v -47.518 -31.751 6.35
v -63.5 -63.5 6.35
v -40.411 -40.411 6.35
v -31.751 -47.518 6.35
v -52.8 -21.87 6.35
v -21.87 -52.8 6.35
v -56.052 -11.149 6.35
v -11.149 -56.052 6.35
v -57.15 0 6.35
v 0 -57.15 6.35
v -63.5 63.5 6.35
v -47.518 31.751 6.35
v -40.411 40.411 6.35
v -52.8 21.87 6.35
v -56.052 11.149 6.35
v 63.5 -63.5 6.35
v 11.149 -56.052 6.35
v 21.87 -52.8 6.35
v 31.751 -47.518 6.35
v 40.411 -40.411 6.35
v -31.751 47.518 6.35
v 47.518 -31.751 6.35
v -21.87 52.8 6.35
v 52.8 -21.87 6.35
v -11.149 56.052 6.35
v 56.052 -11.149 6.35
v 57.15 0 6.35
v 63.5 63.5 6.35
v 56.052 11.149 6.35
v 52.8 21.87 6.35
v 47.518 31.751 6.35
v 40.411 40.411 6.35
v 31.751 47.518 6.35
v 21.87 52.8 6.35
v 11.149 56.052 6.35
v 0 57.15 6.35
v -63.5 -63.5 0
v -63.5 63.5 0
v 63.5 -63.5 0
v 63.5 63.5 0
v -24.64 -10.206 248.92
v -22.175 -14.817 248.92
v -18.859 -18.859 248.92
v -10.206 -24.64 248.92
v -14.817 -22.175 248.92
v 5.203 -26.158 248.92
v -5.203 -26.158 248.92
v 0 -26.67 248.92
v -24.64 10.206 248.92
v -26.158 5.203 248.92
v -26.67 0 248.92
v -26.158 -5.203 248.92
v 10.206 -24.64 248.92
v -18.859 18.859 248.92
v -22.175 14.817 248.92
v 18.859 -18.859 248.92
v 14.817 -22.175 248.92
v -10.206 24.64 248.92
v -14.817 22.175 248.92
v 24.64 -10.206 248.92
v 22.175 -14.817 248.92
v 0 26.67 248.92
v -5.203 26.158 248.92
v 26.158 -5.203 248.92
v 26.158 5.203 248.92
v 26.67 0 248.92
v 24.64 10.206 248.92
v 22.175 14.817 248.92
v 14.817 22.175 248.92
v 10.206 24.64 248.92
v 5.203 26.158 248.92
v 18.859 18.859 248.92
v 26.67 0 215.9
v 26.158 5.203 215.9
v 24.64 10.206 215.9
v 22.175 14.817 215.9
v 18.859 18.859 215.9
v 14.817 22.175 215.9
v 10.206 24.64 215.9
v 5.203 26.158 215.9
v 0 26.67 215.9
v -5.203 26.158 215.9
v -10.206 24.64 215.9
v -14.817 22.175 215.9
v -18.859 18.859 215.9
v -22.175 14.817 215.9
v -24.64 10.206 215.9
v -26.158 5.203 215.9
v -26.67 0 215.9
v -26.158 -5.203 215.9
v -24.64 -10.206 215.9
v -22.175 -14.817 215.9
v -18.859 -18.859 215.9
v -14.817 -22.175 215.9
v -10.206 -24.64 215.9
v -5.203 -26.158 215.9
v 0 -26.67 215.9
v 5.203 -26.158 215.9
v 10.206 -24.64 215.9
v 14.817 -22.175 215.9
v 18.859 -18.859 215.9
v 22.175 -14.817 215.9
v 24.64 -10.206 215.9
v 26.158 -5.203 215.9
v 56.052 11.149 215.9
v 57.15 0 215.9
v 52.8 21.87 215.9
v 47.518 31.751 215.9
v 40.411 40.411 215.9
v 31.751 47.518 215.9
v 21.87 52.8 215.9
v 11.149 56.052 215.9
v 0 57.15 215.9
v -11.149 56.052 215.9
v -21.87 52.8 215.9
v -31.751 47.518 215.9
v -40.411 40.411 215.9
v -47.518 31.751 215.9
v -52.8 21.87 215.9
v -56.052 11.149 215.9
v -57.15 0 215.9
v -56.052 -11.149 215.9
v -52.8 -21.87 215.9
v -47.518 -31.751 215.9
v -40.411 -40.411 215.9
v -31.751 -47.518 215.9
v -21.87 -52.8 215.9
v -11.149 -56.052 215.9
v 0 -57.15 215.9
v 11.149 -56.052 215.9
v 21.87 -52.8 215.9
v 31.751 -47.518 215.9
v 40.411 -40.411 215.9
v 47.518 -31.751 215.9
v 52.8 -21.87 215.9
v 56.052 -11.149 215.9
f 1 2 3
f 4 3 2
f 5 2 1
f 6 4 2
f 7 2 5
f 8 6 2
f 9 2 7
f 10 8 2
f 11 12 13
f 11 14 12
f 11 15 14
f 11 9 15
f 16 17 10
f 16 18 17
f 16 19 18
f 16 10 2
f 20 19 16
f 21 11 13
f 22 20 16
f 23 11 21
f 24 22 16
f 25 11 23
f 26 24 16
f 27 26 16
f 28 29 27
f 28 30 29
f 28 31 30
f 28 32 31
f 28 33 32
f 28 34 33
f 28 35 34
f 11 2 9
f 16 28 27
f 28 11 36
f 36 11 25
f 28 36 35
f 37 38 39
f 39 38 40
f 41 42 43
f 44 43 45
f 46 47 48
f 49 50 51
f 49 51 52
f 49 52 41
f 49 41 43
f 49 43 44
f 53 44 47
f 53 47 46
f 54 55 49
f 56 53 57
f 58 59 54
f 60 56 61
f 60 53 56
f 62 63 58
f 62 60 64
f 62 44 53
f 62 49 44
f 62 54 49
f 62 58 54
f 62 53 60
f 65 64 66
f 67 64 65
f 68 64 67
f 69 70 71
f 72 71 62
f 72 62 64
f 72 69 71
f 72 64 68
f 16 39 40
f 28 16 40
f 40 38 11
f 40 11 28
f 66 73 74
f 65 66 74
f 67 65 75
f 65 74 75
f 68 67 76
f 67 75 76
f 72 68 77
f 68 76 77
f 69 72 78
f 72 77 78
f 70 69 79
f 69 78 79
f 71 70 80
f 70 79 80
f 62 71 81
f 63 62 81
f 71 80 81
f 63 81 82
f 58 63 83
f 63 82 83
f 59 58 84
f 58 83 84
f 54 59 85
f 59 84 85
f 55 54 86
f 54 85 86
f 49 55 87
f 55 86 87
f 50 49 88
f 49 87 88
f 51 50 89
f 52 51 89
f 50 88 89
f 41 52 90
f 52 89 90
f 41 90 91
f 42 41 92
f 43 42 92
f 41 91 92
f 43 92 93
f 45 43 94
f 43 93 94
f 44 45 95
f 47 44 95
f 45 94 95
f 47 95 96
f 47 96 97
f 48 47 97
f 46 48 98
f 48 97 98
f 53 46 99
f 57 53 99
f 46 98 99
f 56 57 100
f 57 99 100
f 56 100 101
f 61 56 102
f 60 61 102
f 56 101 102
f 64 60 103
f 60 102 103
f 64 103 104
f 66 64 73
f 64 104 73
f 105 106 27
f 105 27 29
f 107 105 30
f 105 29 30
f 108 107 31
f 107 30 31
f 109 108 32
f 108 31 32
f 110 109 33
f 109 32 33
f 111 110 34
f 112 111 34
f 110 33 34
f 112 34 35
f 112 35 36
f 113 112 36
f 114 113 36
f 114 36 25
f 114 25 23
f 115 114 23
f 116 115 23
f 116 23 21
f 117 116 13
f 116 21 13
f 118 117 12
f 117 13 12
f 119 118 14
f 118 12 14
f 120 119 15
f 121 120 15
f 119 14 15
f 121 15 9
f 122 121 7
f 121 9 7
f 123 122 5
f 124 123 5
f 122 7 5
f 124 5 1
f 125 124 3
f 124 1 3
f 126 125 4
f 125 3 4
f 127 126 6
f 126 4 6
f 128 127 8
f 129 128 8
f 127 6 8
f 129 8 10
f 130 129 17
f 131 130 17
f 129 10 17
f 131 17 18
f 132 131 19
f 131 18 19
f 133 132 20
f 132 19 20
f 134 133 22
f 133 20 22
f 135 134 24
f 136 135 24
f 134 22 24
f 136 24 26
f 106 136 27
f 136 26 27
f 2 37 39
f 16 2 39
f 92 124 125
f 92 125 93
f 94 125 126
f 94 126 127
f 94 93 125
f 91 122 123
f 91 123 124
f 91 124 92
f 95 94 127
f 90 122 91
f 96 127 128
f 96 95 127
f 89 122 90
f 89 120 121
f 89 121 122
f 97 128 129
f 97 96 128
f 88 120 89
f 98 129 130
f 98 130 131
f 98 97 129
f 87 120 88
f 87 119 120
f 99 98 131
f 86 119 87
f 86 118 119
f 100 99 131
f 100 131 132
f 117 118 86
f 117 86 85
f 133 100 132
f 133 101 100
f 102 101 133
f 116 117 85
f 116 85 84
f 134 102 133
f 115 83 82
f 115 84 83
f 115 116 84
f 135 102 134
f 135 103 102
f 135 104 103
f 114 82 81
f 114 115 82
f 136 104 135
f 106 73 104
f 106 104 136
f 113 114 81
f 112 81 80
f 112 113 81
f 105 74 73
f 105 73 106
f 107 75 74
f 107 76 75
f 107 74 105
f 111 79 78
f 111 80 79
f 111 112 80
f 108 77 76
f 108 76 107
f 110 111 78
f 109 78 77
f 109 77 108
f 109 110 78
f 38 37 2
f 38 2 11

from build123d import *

# Parameters (mm, degrees)
SKETCH1_W           = 127
SKETCH1_H           = 127
BOSS_EXTRUDE1_DEPTH = 6.35
SKETCH2_R           = 57.15
BOSS_EXTRUDE2_DEPTH = 209.55
SKETCH3_R           = 26.67
BOSS_EXTRUDE3_DEPTH = 33.02


with BuildPart() as part:
    # Sketch1 → Boss-Extrude1 (new body)
    with BuildSketch(Plane.XY):
        Rectangle(SKETCH1_W, SKETCH1_H)
    extrude(amount=BOSS_EXTRUDE1_DEPTH)

    # Sketch2 → Boss-Extrude2 (add)
    with BuildSketch(Plane.XY.offset(6.35)):
        Circle(SKETCH2_R)
    extrude(amount=BOSS_EXTRUDE2_DEPTH)

    # Sketch3 → Boss-Extrude3 (add)
    with BuildSketch(Plane.XY.offset(215.9)):
        Circle(SKETCH3_R)
    extrude(amount=BOSS_EXTRUDE3_DEPTH)


solid = part.part
